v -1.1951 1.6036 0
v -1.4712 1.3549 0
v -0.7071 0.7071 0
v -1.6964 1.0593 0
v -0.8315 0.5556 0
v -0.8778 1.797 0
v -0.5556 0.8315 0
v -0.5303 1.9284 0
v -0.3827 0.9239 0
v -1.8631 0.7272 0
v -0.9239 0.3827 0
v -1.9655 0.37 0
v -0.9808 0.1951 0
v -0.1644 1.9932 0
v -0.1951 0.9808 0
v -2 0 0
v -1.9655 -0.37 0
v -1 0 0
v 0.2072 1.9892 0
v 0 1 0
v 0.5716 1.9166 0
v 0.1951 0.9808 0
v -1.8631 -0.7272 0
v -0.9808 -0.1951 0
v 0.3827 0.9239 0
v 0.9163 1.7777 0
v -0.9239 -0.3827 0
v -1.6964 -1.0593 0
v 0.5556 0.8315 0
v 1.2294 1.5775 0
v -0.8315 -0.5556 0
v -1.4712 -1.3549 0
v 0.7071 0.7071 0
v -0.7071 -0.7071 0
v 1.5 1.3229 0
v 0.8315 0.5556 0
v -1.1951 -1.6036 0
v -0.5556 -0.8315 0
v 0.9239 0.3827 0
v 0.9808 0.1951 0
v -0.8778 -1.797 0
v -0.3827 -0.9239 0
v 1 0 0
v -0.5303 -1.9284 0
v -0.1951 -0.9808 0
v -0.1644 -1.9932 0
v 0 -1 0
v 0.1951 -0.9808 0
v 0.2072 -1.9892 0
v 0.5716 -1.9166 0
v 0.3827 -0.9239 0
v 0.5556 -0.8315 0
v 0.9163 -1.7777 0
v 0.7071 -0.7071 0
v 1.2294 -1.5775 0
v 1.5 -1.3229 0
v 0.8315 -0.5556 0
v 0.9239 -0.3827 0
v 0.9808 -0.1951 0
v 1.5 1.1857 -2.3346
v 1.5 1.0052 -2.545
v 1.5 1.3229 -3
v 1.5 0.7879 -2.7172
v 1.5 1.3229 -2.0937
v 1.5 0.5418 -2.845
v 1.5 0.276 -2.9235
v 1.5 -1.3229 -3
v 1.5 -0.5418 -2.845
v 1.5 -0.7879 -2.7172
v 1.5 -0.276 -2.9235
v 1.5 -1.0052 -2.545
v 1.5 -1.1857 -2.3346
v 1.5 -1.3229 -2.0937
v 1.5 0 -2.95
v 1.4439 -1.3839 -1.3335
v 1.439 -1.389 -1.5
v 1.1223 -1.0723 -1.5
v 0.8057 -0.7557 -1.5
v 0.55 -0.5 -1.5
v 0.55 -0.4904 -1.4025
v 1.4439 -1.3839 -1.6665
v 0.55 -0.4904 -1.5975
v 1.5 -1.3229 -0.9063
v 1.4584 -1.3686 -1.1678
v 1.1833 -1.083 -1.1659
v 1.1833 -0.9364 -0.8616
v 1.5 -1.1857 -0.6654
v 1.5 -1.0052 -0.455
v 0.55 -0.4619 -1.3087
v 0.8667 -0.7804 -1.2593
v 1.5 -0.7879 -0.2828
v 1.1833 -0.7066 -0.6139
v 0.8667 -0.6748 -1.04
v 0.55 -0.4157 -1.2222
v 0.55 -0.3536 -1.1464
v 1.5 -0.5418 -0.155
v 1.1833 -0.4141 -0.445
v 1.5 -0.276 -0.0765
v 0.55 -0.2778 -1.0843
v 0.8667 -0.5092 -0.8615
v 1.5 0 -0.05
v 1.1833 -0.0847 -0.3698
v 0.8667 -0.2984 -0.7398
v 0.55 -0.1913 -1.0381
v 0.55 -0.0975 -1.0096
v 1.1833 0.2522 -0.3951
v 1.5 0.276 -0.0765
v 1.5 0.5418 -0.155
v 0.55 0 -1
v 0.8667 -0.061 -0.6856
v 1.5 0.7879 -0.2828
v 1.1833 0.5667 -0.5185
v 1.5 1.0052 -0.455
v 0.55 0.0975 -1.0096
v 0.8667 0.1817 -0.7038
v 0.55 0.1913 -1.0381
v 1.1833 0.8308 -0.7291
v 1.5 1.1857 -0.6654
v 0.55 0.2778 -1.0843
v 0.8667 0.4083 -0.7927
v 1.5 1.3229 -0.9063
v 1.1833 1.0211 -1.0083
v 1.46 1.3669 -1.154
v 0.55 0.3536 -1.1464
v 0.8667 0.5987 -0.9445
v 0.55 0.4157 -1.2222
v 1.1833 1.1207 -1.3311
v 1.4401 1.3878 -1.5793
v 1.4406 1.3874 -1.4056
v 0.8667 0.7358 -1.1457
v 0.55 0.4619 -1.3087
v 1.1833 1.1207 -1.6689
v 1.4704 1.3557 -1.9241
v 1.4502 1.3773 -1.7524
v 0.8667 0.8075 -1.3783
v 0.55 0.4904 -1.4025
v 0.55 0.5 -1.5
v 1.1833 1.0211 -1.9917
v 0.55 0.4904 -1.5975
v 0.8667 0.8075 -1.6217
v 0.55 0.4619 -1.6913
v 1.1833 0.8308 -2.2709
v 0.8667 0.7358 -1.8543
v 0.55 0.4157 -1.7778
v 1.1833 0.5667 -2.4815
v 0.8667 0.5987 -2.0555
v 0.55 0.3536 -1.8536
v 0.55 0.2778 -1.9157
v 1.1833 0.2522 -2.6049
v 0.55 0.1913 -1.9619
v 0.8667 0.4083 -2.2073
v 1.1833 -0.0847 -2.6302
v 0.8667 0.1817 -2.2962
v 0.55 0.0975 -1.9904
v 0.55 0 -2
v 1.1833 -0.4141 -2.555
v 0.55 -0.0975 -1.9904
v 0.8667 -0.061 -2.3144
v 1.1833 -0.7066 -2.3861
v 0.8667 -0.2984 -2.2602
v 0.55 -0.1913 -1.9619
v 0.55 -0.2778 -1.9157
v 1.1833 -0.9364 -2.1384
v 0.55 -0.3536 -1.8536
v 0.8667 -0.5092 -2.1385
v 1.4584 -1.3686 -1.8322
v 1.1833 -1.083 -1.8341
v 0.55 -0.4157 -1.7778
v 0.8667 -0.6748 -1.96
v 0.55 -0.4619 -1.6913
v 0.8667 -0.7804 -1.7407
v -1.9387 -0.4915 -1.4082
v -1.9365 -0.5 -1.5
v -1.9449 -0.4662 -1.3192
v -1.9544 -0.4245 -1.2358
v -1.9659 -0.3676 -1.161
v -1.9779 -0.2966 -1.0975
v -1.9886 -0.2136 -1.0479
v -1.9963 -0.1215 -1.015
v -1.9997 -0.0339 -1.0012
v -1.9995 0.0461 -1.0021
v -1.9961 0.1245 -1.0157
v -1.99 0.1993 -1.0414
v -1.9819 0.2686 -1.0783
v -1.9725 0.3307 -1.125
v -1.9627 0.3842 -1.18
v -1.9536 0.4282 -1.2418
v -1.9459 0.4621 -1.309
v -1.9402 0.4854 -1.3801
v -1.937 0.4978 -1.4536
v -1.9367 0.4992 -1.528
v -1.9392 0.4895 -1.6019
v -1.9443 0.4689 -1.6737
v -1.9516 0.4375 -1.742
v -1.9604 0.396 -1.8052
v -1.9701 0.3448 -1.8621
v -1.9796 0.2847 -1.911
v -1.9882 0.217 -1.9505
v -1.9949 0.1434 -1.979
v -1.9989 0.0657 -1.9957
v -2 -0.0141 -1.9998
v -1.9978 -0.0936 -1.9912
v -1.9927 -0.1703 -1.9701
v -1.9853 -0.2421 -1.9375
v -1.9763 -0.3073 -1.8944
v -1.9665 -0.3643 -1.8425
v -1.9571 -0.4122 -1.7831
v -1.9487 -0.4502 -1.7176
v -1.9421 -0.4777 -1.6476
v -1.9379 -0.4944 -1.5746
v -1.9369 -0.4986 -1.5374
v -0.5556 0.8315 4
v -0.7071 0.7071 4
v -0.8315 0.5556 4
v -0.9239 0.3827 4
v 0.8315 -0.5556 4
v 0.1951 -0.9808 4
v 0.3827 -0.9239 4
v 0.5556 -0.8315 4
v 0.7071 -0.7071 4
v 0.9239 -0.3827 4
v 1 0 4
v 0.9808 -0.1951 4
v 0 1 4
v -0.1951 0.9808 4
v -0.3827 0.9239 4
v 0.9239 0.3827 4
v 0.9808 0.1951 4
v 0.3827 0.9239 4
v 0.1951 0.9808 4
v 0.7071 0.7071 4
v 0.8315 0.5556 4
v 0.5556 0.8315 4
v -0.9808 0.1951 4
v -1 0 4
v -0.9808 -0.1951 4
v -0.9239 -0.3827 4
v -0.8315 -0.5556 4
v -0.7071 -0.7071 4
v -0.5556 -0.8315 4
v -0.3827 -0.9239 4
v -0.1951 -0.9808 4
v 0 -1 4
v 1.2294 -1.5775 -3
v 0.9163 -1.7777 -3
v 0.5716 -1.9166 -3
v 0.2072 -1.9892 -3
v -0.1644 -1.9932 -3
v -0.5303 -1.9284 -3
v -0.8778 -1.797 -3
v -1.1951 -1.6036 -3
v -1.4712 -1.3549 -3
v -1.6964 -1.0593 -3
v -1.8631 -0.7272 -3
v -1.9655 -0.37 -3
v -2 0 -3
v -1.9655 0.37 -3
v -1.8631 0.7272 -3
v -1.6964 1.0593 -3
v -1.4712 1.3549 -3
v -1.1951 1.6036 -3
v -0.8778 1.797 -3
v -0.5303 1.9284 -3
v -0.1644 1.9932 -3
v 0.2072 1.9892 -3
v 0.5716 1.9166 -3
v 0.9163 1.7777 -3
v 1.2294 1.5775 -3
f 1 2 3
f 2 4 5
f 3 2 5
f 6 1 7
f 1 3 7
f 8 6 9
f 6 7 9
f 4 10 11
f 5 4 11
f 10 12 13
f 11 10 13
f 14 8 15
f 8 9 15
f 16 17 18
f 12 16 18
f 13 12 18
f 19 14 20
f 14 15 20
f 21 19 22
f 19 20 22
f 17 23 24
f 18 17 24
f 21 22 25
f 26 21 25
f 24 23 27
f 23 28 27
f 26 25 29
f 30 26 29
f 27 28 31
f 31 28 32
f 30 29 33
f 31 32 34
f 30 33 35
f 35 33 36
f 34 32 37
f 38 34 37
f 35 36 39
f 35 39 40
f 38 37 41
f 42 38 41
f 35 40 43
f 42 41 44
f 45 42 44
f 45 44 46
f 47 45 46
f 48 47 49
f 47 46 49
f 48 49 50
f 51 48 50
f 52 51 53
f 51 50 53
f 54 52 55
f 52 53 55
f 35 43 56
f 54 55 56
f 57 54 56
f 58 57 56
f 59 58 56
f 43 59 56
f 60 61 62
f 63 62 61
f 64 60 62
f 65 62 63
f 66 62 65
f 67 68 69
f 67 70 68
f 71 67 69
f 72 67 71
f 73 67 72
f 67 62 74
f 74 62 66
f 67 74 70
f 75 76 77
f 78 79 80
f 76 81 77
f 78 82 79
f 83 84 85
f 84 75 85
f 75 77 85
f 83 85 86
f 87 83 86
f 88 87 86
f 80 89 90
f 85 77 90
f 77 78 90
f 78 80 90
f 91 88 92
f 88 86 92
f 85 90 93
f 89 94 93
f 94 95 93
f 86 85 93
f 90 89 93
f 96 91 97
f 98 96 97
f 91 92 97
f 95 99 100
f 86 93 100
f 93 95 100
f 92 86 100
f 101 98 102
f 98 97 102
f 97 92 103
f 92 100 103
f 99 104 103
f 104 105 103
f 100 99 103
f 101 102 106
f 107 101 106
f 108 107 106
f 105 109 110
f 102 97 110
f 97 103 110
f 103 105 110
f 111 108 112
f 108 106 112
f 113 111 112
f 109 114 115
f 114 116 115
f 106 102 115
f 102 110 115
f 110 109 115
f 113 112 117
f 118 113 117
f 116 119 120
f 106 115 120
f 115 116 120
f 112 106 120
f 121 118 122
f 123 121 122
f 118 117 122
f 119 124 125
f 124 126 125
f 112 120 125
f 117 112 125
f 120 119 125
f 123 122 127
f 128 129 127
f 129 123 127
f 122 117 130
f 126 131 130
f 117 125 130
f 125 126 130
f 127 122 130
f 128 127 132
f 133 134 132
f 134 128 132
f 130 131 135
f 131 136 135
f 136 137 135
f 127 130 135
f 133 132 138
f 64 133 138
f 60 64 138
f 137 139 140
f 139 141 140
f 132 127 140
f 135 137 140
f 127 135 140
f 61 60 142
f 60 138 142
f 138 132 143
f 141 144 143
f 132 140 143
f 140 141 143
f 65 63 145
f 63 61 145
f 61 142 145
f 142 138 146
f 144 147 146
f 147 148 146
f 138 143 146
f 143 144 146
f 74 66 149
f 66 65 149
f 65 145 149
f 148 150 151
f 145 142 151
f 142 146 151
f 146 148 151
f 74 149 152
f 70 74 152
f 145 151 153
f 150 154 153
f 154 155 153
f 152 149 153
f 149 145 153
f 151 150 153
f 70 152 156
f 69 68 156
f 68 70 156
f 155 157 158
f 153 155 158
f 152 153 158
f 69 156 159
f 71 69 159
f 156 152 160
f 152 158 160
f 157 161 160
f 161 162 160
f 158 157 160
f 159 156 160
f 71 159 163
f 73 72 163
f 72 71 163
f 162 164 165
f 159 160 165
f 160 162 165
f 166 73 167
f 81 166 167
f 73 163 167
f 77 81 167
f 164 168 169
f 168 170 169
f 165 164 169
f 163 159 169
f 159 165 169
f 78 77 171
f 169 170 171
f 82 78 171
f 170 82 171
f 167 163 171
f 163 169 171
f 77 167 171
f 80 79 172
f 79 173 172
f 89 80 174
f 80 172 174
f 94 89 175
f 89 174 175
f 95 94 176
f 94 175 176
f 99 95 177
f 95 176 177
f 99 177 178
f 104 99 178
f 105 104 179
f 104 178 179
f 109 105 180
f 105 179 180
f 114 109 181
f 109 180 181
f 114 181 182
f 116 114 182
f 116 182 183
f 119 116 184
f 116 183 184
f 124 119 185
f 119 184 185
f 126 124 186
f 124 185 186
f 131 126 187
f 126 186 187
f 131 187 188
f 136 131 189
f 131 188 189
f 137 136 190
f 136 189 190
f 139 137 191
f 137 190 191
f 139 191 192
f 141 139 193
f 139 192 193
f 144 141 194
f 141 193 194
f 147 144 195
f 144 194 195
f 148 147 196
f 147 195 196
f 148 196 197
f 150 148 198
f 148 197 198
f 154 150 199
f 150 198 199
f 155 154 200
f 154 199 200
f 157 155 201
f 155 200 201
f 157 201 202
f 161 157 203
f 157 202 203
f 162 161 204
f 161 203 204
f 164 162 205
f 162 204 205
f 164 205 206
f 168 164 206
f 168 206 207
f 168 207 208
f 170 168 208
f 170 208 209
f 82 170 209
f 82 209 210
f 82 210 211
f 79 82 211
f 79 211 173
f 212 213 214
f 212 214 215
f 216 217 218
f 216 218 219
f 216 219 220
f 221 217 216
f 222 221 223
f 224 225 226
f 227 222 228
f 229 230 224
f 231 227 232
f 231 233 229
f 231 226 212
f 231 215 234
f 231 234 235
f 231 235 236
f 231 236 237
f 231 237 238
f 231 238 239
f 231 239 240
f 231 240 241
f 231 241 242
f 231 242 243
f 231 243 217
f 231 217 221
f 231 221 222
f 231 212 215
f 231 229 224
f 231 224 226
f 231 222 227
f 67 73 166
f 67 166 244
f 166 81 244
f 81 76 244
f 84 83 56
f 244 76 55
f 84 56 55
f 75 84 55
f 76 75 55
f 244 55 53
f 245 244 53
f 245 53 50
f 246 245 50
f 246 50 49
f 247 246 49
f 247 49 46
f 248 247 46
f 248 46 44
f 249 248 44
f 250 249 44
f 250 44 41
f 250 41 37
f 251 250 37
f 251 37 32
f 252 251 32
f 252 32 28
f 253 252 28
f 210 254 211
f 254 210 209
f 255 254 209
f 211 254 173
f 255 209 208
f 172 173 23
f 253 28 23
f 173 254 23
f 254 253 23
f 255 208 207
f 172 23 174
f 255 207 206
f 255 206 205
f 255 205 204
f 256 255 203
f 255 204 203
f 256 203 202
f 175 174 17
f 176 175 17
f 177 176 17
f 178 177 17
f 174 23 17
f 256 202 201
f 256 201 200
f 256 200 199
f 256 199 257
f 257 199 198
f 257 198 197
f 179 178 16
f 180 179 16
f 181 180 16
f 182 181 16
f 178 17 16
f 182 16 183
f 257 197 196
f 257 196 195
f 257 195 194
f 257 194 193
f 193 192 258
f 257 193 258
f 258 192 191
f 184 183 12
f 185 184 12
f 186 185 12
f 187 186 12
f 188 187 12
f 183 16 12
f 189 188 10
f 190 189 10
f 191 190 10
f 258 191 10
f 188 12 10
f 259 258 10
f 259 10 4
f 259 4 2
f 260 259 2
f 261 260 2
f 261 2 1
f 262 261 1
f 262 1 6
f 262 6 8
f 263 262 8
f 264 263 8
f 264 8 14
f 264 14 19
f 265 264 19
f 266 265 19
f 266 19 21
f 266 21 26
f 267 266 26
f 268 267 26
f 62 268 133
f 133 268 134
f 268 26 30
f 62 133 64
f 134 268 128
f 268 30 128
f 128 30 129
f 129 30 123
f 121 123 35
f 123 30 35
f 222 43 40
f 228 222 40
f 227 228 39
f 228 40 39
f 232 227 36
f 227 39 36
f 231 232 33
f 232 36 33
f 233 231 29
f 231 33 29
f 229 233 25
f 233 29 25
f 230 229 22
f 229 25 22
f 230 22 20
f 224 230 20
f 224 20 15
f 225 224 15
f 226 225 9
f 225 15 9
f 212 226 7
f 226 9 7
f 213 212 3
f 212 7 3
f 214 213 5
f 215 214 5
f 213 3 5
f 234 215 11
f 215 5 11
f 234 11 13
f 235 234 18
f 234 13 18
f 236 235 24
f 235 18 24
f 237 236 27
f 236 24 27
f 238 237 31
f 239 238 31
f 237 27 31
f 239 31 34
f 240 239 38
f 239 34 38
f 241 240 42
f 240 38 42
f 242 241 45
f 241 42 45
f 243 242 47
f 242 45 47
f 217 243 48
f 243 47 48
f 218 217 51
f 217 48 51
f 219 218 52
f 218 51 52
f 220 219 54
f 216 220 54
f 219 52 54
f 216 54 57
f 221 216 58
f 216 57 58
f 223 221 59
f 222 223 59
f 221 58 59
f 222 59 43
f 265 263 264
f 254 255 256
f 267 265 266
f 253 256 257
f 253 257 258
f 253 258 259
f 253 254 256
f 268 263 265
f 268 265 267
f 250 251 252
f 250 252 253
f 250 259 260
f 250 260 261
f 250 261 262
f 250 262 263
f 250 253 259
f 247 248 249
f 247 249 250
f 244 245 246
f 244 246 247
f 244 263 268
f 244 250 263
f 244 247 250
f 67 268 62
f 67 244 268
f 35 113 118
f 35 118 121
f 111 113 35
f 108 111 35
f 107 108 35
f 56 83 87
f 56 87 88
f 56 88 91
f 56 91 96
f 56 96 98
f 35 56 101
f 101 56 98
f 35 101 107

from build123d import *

# Parameters (mm, degrees)
F0_R           = 1
F1_DEPTH       = 4
F2_R           = 2
F3_DEPTH       = 3
F6_D           = 1
F6_CSINK_D     = 2.9
F6_CSINK_ANGLE = 90
F7_W           = 3.740538
F7_H           = 4.958128
F8_DEPTH       = 25
F8_DEPTH_BACK  = 25


with BuildPart() as f1:
    # F0 (on Top) → F1 (new body)
    with BuildSketch(Plane.XY):
        Circle(F0_R)
    extrude(amount=F1_DEPTH)

    # F2 (on face) → F3 (join)
    with BuildSketch(Plane(origin=(0, 0, 0), x_dir=(1, 0, 0), z_dir=(0, 0, -1))):
        Circle(F2_R)
    extrude(amount=F3_DEPTH)

    # F6 (through all)
    with Locations(Plane.YZ.offset(1.5)):
        with Locations((0, -1.5)):
            CounterSinkHole(F6_D / 2, F6_CSINK_D / 2, counter_sink_angle=F6_CSINK_ANGLE)

    # F7 (on Front) → F8 (cut, two sides)
    with BuildSketch(Plane.XZ) as f8_sk:
        with Locations((3.370269, -2.379064)):
            Rectangle(F7_W, F7_H)
    extrude(amount=F8_DEPTH, mode=Mode.SUBTRACT)
    extrude(f8_sk.sketch, amount=-F8_DEPTH_BACK, mode=Mode.SUBTRACT)


solid = f1.part
